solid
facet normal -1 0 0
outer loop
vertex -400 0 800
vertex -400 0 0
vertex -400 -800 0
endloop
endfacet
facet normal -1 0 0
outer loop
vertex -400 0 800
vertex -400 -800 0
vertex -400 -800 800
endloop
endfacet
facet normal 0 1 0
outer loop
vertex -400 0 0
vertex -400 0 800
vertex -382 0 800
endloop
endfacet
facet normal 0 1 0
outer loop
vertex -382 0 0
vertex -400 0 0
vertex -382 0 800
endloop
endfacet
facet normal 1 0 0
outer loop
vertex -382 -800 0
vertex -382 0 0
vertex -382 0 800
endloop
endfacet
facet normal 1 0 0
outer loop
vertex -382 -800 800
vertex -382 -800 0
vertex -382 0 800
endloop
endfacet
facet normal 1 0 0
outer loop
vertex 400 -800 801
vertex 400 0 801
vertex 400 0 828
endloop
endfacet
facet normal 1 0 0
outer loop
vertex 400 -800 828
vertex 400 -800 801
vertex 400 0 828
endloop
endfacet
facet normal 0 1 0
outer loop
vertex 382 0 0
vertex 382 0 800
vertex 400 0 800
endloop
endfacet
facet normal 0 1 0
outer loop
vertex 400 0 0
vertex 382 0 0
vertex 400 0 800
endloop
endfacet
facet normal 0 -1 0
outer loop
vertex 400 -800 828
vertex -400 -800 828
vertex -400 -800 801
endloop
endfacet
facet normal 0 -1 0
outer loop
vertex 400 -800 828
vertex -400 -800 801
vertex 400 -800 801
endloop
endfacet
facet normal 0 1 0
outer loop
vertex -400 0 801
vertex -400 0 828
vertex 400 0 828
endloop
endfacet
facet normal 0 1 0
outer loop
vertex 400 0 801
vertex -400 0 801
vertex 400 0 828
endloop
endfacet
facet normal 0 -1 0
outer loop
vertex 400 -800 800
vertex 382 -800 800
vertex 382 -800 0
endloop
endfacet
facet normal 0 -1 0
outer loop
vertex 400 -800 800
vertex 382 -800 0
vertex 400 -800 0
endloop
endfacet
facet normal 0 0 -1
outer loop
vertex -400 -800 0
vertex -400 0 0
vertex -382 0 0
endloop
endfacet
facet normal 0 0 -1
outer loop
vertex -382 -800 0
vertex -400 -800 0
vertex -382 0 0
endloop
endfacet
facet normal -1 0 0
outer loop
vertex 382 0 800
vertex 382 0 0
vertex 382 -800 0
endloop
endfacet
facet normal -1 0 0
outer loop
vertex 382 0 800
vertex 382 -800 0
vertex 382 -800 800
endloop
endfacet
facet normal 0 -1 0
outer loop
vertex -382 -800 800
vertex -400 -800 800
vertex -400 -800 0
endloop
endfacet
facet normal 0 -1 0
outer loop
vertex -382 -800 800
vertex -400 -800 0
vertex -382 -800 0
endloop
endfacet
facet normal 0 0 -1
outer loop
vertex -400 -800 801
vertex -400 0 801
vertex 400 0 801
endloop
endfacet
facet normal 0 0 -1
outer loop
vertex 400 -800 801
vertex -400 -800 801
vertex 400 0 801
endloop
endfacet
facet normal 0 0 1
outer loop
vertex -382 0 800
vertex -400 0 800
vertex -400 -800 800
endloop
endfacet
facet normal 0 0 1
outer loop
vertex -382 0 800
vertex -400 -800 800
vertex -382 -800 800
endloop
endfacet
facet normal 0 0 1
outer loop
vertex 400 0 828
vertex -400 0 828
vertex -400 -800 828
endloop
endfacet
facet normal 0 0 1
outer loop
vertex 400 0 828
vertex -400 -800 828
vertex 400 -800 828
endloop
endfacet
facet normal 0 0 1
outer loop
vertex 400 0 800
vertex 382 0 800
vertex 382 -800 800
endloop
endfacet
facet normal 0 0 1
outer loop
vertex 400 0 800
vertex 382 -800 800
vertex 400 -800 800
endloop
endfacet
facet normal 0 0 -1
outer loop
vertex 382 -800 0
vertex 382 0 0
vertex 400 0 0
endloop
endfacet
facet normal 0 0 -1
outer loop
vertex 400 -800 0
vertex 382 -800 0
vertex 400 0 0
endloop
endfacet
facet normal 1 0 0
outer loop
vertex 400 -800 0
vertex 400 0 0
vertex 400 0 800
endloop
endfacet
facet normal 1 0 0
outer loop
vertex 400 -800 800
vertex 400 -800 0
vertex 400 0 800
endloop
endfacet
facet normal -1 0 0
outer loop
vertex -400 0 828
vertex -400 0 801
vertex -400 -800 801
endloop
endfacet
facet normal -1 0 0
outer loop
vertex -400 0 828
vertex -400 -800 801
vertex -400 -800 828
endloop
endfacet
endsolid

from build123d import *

# Parameters (mm, degrees)
F0_W     = 18
F0_H     = 800
F0_W_2   = 800
F0_H_2   = 27
F1_DEPTH = 800


with BuildPart() as f1:
    # F0 (on Front) → F1 (new body)
    with BuildSketch(Plane.XZ):
        with Locations((-391, 400)):
            Rectangle(F0_W, F0_H)
        with Locations((0, 814.5)):
            Rectangle(F0_W_2, F0_H_2)
        with Locations((391, 400)):
            Rectangle(F0_W, F0_H)
    extrude(amount=F1_DEPTH)


solid = f1.part
